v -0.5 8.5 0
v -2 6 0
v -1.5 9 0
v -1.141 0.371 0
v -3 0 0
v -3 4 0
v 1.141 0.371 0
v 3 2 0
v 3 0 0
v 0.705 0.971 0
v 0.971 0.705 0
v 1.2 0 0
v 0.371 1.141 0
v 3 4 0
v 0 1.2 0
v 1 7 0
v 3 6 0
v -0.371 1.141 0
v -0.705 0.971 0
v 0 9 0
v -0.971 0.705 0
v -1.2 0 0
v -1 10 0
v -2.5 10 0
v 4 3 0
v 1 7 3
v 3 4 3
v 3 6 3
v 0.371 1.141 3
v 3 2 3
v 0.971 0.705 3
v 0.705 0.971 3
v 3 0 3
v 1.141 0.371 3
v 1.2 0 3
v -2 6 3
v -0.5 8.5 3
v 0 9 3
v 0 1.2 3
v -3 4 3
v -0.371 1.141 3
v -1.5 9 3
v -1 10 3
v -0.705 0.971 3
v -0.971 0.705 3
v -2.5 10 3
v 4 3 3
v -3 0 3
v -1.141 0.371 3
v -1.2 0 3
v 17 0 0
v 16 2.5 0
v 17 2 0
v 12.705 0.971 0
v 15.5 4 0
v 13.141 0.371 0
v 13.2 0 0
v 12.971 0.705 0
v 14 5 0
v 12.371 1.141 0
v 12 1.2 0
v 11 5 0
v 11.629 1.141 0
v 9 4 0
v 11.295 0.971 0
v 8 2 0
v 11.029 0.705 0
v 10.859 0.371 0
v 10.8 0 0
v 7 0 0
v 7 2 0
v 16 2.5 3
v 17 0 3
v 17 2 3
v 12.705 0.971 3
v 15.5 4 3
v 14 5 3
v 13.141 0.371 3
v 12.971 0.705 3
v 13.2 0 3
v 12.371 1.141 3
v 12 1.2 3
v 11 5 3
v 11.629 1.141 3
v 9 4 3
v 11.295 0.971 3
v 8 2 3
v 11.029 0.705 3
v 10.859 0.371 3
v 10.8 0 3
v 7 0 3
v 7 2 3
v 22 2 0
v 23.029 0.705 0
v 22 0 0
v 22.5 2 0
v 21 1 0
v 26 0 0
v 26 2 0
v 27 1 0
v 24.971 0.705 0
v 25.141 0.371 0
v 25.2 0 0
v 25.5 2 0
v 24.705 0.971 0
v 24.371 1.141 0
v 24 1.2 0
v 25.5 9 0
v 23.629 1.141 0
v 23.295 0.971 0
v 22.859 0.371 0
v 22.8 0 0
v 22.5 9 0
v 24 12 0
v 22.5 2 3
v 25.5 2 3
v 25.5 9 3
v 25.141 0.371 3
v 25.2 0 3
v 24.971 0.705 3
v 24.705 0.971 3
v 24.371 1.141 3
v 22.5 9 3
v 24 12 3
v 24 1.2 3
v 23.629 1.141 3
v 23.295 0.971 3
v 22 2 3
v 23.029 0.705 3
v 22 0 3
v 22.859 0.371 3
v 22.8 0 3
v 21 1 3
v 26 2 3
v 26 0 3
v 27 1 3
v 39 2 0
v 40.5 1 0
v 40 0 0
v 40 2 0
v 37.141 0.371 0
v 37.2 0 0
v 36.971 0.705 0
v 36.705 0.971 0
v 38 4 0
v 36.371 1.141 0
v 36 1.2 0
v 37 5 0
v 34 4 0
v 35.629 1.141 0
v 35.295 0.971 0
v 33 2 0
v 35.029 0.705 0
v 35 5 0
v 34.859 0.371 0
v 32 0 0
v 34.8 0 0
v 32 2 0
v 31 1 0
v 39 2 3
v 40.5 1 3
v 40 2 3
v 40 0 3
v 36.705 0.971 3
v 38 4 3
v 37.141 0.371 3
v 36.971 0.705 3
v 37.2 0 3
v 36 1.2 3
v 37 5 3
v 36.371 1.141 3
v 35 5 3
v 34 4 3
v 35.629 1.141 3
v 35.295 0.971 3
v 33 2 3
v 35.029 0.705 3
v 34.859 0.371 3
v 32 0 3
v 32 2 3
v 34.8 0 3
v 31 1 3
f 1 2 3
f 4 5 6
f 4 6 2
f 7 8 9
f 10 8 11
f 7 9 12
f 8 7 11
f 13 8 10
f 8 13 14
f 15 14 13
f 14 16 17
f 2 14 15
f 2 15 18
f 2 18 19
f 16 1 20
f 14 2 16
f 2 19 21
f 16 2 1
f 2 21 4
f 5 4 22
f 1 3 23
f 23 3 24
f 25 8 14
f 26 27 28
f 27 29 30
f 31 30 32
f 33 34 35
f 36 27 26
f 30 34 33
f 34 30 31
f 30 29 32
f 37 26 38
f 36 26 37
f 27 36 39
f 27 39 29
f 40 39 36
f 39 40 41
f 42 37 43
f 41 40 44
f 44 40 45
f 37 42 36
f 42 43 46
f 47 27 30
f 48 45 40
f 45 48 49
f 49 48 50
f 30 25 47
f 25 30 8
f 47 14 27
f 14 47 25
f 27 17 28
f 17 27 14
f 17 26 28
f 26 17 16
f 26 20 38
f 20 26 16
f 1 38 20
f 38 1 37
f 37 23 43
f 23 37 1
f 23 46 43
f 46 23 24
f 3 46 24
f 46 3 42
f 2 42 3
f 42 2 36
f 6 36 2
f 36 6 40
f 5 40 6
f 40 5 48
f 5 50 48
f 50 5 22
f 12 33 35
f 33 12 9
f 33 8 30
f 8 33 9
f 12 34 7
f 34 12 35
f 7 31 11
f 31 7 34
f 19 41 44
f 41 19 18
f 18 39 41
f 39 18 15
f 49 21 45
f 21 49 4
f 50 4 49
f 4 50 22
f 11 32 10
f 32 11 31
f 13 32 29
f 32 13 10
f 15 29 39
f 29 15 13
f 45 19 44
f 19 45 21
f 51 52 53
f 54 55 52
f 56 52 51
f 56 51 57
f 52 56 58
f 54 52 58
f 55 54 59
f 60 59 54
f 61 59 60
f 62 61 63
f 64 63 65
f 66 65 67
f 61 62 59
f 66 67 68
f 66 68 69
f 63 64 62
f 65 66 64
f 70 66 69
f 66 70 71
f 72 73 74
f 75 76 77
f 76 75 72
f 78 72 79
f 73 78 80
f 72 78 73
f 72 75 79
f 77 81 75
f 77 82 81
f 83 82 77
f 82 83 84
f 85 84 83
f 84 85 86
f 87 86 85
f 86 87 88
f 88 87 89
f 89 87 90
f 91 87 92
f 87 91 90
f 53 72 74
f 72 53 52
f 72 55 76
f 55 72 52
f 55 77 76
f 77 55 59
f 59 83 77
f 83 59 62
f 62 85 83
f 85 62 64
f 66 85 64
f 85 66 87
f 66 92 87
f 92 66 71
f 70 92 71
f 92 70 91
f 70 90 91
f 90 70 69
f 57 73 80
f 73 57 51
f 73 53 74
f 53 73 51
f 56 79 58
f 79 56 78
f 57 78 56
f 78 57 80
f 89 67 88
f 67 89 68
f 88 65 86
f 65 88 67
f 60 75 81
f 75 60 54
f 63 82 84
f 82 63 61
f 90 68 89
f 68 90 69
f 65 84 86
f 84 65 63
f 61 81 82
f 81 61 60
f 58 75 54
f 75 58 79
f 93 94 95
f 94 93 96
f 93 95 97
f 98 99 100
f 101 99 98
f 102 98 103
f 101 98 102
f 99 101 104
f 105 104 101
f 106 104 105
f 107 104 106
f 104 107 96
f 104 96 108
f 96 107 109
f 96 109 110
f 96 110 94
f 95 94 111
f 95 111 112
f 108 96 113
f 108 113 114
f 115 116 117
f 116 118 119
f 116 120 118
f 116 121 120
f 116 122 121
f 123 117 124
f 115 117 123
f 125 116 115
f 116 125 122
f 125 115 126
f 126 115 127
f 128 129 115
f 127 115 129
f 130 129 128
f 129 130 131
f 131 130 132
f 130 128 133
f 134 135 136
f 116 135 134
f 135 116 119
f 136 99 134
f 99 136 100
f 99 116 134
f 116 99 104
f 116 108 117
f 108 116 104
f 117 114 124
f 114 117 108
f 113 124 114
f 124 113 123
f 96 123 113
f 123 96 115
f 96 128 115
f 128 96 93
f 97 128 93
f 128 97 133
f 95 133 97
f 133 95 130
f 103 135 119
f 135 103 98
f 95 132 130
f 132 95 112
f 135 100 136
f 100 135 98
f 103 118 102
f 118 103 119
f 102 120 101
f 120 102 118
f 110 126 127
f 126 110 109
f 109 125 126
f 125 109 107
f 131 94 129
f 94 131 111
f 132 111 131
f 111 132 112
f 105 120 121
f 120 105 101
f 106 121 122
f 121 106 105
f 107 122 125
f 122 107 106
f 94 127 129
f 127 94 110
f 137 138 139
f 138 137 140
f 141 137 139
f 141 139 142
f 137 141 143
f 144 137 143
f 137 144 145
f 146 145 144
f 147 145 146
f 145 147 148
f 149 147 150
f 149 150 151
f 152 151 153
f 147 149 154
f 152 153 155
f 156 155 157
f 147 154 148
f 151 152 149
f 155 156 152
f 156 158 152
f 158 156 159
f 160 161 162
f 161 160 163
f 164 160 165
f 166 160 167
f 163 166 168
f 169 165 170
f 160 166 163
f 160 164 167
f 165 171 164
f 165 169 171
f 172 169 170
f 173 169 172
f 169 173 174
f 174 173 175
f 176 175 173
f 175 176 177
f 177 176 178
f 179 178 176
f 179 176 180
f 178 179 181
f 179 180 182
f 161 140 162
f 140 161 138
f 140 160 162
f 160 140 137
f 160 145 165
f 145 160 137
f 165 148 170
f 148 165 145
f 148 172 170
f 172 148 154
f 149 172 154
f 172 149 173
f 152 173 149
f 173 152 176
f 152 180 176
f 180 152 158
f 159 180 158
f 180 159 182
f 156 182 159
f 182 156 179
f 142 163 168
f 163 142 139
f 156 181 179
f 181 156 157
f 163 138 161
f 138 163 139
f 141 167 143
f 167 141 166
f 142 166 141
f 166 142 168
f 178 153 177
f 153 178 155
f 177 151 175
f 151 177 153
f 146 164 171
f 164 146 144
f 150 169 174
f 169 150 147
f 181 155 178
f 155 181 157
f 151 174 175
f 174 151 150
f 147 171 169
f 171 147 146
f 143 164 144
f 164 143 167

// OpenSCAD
use <carousel.scad>
// All 4 vehicles arranged on bed
vehicle_horse();
translate([12, 0, 0]) vehicle_car();
translate([24, 0, 0]) vehicle_rocket();
translate([36, 0, 0]) vehicle_boat();
